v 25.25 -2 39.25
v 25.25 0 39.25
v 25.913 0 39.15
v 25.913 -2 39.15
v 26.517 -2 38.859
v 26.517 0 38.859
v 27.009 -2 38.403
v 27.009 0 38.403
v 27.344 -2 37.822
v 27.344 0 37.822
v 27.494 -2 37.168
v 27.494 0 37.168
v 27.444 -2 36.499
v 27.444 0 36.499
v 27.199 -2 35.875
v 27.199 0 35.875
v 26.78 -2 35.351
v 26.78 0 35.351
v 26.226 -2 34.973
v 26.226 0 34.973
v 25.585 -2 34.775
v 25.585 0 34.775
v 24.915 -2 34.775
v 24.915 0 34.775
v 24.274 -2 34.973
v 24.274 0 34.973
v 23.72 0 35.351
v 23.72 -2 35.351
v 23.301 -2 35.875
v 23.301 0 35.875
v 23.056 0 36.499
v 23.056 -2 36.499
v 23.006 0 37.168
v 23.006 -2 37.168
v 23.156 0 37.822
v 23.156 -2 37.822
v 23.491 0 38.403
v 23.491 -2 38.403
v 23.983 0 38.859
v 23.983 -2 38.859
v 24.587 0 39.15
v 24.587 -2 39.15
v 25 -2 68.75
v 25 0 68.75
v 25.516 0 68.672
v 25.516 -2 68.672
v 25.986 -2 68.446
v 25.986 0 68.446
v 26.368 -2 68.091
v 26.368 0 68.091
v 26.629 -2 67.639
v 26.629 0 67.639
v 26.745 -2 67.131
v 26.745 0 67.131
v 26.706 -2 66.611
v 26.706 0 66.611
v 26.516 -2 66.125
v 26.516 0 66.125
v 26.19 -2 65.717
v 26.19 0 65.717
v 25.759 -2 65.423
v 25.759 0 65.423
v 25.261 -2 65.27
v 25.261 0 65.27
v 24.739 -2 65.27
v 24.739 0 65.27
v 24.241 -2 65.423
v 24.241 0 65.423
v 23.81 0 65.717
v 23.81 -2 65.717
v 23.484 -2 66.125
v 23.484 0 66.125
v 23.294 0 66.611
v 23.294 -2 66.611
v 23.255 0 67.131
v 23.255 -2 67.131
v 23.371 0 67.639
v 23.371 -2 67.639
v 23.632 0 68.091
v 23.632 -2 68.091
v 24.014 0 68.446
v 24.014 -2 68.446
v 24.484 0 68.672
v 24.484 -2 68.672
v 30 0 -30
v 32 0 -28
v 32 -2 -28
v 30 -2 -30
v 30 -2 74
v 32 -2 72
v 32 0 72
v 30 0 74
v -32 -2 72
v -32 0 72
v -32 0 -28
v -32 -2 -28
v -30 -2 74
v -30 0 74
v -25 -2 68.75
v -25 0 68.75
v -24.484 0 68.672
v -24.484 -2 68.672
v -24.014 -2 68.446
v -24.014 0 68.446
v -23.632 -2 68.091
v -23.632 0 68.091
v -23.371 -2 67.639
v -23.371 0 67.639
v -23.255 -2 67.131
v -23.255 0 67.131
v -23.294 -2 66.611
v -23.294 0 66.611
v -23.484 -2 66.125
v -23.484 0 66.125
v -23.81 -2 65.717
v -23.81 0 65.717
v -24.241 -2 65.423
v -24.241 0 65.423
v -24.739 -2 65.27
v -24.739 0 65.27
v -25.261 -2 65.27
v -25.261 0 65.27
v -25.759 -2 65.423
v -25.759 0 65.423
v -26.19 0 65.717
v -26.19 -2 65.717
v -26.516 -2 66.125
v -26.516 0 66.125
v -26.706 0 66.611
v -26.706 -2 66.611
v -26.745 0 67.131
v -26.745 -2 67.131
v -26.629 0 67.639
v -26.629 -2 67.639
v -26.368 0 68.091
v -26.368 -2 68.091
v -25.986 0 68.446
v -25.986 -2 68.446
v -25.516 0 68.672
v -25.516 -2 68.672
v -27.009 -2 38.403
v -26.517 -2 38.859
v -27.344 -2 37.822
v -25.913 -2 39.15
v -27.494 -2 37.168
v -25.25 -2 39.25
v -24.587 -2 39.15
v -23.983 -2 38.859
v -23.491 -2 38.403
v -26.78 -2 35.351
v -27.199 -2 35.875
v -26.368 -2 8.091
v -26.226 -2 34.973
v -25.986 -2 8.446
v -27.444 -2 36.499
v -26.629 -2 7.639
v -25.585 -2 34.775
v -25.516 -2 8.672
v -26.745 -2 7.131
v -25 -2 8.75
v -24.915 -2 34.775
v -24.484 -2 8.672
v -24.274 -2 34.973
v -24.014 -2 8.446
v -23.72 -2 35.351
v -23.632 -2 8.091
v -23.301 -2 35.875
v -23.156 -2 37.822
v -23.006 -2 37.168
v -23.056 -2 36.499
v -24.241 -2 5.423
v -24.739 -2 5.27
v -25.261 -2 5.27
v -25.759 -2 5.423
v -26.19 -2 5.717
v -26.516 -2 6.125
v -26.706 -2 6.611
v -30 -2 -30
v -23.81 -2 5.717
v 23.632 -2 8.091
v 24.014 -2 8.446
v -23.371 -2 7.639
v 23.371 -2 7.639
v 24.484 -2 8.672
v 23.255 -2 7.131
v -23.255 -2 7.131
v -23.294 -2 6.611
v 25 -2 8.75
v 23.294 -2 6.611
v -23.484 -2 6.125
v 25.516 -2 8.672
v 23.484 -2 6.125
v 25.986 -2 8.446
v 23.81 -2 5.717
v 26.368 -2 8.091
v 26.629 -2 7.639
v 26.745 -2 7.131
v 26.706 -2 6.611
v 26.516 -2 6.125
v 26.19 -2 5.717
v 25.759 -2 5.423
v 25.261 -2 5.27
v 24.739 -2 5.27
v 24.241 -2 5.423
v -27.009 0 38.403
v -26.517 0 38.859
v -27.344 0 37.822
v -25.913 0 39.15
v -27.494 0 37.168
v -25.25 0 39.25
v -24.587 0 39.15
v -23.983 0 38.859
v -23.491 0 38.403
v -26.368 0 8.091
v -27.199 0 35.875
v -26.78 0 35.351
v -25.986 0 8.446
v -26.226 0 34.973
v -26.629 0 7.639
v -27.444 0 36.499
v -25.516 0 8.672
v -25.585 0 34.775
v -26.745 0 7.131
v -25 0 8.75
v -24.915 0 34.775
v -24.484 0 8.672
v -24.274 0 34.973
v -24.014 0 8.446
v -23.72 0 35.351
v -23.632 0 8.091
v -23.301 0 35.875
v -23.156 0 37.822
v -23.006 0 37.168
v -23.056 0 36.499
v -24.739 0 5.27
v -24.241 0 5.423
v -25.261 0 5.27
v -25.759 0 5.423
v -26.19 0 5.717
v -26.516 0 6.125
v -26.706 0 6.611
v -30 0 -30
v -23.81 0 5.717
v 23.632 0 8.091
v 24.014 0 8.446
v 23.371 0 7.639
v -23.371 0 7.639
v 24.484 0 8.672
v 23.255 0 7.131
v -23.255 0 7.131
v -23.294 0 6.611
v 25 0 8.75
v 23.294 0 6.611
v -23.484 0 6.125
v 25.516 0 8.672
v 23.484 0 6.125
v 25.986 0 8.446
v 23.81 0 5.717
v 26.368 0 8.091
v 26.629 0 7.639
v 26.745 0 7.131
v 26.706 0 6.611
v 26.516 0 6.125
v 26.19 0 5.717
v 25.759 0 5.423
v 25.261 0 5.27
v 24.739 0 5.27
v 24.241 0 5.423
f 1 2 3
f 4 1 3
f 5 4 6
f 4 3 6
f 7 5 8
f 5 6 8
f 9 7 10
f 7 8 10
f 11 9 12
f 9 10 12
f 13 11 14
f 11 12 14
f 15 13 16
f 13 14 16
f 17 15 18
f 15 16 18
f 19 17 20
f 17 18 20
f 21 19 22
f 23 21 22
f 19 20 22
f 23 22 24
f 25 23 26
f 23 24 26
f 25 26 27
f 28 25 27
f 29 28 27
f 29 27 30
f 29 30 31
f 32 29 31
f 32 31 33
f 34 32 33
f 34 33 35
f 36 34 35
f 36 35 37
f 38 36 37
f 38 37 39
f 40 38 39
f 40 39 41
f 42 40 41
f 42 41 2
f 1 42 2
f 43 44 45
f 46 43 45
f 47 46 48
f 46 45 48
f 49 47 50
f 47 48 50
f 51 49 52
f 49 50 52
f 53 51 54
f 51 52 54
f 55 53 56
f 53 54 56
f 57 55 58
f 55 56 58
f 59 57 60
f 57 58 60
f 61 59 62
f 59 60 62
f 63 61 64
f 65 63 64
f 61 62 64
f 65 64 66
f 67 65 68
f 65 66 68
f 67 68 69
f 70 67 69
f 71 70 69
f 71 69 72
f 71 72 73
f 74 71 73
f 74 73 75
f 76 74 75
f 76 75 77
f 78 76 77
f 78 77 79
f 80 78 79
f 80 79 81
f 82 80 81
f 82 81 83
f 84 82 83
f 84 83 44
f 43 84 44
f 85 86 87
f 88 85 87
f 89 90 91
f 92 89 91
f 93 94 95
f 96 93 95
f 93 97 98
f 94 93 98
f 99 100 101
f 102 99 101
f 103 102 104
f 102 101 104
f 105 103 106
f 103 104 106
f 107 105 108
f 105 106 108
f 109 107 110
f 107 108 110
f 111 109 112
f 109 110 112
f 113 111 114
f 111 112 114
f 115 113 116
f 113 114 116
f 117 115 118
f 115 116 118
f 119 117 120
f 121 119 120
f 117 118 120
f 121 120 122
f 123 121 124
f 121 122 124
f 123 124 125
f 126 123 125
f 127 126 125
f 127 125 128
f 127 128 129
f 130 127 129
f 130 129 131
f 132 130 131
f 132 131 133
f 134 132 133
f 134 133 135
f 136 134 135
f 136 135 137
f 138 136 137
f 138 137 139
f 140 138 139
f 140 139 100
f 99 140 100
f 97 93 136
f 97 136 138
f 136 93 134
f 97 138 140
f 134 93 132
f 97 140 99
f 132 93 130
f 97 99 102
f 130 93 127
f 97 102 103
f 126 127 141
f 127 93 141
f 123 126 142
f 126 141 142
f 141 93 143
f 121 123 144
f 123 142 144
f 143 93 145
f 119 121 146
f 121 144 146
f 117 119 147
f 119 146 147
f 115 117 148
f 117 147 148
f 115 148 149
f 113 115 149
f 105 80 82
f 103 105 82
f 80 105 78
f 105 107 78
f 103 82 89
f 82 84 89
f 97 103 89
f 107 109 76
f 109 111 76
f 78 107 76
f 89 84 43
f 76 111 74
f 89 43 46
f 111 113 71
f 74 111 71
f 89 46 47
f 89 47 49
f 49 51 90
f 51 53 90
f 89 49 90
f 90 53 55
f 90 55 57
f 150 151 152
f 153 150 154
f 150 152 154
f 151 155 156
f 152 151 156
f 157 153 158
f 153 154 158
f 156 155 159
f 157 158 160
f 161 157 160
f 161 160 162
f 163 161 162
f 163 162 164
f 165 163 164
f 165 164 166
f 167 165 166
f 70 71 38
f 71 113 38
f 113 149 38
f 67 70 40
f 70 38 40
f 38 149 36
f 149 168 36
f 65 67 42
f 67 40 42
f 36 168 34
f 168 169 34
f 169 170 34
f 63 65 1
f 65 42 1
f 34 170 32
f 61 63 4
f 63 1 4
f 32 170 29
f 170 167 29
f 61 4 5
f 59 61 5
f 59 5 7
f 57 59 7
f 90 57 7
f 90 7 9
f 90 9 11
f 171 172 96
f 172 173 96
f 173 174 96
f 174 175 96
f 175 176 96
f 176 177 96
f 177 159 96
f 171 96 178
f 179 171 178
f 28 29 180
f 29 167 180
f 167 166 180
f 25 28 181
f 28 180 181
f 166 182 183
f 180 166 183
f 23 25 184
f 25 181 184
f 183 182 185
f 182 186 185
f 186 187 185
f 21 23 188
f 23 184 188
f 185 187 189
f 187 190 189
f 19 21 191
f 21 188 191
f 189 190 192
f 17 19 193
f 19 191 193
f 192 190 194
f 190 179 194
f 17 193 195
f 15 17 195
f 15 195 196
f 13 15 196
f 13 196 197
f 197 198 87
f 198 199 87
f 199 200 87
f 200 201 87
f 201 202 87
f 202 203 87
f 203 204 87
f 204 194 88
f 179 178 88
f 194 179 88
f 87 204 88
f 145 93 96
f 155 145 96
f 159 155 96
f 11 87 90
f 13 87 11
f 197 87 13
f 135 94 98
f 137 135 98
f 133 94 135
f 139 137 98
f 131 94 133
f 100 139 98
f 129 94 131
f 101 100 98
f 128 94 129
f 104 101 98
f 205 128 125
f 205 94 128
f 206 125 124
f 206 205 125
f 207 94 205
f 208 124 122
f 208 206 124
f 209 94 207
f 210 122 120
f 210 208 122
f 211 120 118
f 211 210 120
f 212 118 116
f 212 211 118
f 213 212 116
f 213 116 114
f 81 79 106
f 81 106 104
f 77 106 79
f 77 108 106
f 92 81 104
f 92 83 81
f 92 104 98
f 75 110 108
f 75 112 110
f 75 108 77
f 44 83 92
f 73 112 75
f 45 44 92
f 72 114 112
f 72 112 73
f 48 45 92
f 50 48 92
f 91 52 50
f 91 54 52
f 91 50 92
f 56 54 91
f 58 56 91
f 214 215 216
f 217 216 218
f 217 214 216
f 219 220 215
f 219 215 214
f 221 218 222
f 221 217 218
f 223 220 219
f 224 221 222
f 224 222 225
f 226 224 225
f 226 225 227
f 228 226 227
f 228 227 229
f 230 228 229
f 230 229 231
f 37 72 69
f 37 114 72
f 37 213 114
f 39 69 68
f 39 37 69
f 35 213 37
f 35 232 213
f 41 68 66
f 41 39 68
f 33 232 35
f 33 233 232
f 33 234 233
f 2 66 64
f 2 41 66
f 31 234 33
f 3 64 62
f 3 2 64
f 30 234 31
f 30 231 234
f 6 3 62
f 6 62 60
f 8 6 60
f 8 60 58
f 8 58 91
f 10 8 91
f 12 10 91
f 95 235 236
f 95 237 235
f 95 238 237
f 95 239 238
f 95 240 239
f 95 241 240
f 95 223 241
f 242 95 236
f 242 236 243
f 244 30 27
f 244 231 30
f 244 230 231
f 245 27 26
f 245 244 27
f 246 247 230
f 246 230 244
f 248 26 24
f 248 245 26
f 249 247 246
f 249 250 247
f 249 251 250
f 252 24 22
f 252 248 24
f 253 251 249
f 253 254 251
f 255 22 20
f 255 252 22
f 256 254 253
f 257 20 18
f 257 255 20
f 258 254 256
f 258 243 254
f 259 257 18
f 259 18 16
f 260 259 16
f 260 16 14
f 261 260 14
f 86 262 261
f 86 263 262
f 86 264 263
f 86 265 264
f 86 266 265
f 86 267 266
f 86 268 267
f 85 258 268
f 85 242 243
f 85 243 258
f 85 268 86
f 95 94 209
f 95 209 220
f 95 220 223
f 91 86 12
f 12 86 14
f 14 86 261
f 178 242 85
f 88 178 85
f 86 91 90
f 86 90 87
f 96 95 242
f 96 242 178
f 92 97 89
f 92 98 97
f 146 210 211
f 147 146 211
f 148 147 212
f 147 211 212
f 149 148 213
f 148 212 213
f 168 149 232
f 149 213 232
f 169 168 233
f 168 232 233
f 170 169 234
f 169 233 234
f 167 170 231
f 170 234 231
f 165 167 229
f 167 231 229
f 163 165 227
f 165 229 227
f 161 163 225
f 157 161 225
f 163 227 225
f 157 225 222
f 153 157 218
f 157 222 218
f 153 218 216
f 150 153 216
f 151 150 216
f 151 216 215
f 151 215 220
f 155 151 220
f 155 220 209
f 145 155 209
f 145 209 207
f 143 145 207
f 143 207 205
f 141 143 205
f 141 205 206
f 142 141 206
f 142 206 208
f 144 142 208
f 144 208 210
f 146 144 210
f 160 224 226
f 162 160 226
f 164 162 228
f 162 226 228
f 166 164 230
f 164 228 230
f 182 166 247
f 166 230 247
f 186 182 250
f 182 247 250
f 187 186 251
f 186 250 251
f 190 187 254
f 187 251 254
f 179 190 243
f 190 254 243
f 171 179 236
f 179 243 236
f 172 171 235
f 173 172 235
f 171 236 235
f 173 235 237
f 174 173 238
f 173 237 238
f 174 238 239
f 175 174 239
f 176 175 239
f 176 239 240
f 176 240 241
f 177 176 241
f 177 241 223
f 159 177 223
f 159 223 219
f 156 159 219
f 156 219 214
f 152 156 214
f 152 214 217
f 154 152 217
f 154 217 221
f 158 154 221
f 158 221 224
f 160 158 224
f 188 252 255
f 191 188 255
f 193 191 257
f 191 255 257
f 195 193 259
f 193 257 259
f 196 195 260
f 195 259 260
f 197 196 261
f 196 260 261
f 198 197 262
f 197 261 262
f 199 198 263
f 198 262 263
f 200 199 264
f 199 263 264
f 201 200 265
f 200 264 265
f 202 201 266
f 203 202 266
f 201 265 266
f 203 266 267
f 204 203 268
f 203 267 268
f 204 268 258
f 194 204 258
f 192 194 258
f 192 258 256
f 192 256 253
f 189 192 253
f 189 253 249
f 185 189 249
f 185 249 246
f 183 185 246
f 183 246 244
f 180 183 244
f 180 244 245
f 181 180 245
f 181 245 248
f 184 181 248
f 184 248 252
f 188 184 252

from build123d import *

# Parameters (mm, degrees)
SKETCH1_W          = 64
SKETCH1_H          = 2
BASE_FLANGE1_DEPTH = 74
SKETCH2_R          = 1.75
CUT_EXTRUDE1_DEPTH = 10
CHAMFER1_SIZE      = 2
SKETCH8_W          = 64
SKETCH8_H          = 30
TAB1_DEPTH         = 2
CHAMFER2_SIZE      = 2
CUT_EXTRUDE2_REACH = 82.647
SKETCH9_R          = 2.25


# Sheet-metal steps are written as plain solids
with BuildPart() as part:
    # Sketch1 → Base-Flange1 (new body)
    with BuildSketch(Plane.XY):
        with Locations((0, -1)):
            Rectangle(SKETCH1_W, SKETCH1_H)
    extrude(amount=BASE_FLANGE1_DEPTH)

    # Sketch2 → Cut-Extrude1 (cut)
    with BuildSketch(Plane(origin=(0, 0, 0), x_dir=(1, 0, 0), z_dir=(0, 1, 0))):
        with Locations(Location((-25, -7, 0), (0, 0, 270))):
            Circle(SKETCH2_R)
        with Locations(Location((-25, -67, 0), (0, 0, 270))):
            Circle(SKETCH2_R)
        with Locations(Location((25, -67, 0), (0, 0, 270))):
            Circle(SKETCH2_R)
        with Locations(Location((25, -7, 0), (0, 0, 270))):
            Circle(SKETCH2_R)
    extrude(amount=-CUT_EXTRUDE1_DEPTH, mode=Mode.SUBTRACT)

    # Chamfer1
    chamfer1_edges = [part.edges().sort_by_distance(p)[0] for p in [
        (-32, -1, 74),
        (32, -1, 74),
    ]]
    chamfer(chamfer1_edges, length=CHAMFER1_SIZE)

    # Sketch8 → Tab1 (add)
    with BuildSketch(Plane(origin=(0, 0, 0), x_dir=(1, 0, 0), z_dir=(0, 1, 0))):
        with Locations((0, 15)):
            Rectangle(SKETCH8_W, SKETCH8_H)
    extrude(amount=-TAB1_DEPTH)

    # Chamfer2
    chamfer2_edges = [part.edges().sort_by_distance(p)[0] for p in [
        (-32, -1, -30),
        (32, -1, -30),
    ]]
    chamfer(chamfer2_edges, length=CHAMFER2_SIZE)

    # Sketch9 → Cut-Extrude2 (cut, up to next)
    with BuildSketch(Plane(origin=(0, 0, 0), x_dir=(1, 0, 0), z_dir=(0, 1, 0)), mode=Mode.PRIVATE) as cut_extrude2_sk1:
        with Locations(Location((-25.25, -37, 0), (0, 0, 270))):
            Circle(SKETCH9_R)
    cut_extrude2_tool1 = extrude(cut_extrude2_sk1.sketch, amount=-CUT_EXTRUDE2_REACH, mode=Mode.PRIVATE) & part.part
    # Sketch9 → Cut-Extrude2 (cut, up to next)
    with BuildSketch(Plane(origin=(0, 0, 0), x_dir=(1, 0, 0), z_dir=(0, 1, 0)), mode=Mode.PRIVATE) as cut_extrude2_sk2:
        with Locations(Location((25.25, -37, 0), (0, 0, 270))):
            Circle(SKETCH9_R)
    cut_extrude2_tool2 = extrude(cut_extrude2_sk2.sketch, amount=-CUT_EXTRUDE2_REACH, mode=Mode.PRIVATE) & part.part
    add(cut_extrude2_tool1.solids().sort_by_distance((-25.25, 0, 37))[0], mode=Mode.SUBTRACT)
    add(cut_extrude2_tool2.solids().sort_by_distance((25.25, 0, 37))[0], mode=Mode.SUBTRACT)


solid = part.part
